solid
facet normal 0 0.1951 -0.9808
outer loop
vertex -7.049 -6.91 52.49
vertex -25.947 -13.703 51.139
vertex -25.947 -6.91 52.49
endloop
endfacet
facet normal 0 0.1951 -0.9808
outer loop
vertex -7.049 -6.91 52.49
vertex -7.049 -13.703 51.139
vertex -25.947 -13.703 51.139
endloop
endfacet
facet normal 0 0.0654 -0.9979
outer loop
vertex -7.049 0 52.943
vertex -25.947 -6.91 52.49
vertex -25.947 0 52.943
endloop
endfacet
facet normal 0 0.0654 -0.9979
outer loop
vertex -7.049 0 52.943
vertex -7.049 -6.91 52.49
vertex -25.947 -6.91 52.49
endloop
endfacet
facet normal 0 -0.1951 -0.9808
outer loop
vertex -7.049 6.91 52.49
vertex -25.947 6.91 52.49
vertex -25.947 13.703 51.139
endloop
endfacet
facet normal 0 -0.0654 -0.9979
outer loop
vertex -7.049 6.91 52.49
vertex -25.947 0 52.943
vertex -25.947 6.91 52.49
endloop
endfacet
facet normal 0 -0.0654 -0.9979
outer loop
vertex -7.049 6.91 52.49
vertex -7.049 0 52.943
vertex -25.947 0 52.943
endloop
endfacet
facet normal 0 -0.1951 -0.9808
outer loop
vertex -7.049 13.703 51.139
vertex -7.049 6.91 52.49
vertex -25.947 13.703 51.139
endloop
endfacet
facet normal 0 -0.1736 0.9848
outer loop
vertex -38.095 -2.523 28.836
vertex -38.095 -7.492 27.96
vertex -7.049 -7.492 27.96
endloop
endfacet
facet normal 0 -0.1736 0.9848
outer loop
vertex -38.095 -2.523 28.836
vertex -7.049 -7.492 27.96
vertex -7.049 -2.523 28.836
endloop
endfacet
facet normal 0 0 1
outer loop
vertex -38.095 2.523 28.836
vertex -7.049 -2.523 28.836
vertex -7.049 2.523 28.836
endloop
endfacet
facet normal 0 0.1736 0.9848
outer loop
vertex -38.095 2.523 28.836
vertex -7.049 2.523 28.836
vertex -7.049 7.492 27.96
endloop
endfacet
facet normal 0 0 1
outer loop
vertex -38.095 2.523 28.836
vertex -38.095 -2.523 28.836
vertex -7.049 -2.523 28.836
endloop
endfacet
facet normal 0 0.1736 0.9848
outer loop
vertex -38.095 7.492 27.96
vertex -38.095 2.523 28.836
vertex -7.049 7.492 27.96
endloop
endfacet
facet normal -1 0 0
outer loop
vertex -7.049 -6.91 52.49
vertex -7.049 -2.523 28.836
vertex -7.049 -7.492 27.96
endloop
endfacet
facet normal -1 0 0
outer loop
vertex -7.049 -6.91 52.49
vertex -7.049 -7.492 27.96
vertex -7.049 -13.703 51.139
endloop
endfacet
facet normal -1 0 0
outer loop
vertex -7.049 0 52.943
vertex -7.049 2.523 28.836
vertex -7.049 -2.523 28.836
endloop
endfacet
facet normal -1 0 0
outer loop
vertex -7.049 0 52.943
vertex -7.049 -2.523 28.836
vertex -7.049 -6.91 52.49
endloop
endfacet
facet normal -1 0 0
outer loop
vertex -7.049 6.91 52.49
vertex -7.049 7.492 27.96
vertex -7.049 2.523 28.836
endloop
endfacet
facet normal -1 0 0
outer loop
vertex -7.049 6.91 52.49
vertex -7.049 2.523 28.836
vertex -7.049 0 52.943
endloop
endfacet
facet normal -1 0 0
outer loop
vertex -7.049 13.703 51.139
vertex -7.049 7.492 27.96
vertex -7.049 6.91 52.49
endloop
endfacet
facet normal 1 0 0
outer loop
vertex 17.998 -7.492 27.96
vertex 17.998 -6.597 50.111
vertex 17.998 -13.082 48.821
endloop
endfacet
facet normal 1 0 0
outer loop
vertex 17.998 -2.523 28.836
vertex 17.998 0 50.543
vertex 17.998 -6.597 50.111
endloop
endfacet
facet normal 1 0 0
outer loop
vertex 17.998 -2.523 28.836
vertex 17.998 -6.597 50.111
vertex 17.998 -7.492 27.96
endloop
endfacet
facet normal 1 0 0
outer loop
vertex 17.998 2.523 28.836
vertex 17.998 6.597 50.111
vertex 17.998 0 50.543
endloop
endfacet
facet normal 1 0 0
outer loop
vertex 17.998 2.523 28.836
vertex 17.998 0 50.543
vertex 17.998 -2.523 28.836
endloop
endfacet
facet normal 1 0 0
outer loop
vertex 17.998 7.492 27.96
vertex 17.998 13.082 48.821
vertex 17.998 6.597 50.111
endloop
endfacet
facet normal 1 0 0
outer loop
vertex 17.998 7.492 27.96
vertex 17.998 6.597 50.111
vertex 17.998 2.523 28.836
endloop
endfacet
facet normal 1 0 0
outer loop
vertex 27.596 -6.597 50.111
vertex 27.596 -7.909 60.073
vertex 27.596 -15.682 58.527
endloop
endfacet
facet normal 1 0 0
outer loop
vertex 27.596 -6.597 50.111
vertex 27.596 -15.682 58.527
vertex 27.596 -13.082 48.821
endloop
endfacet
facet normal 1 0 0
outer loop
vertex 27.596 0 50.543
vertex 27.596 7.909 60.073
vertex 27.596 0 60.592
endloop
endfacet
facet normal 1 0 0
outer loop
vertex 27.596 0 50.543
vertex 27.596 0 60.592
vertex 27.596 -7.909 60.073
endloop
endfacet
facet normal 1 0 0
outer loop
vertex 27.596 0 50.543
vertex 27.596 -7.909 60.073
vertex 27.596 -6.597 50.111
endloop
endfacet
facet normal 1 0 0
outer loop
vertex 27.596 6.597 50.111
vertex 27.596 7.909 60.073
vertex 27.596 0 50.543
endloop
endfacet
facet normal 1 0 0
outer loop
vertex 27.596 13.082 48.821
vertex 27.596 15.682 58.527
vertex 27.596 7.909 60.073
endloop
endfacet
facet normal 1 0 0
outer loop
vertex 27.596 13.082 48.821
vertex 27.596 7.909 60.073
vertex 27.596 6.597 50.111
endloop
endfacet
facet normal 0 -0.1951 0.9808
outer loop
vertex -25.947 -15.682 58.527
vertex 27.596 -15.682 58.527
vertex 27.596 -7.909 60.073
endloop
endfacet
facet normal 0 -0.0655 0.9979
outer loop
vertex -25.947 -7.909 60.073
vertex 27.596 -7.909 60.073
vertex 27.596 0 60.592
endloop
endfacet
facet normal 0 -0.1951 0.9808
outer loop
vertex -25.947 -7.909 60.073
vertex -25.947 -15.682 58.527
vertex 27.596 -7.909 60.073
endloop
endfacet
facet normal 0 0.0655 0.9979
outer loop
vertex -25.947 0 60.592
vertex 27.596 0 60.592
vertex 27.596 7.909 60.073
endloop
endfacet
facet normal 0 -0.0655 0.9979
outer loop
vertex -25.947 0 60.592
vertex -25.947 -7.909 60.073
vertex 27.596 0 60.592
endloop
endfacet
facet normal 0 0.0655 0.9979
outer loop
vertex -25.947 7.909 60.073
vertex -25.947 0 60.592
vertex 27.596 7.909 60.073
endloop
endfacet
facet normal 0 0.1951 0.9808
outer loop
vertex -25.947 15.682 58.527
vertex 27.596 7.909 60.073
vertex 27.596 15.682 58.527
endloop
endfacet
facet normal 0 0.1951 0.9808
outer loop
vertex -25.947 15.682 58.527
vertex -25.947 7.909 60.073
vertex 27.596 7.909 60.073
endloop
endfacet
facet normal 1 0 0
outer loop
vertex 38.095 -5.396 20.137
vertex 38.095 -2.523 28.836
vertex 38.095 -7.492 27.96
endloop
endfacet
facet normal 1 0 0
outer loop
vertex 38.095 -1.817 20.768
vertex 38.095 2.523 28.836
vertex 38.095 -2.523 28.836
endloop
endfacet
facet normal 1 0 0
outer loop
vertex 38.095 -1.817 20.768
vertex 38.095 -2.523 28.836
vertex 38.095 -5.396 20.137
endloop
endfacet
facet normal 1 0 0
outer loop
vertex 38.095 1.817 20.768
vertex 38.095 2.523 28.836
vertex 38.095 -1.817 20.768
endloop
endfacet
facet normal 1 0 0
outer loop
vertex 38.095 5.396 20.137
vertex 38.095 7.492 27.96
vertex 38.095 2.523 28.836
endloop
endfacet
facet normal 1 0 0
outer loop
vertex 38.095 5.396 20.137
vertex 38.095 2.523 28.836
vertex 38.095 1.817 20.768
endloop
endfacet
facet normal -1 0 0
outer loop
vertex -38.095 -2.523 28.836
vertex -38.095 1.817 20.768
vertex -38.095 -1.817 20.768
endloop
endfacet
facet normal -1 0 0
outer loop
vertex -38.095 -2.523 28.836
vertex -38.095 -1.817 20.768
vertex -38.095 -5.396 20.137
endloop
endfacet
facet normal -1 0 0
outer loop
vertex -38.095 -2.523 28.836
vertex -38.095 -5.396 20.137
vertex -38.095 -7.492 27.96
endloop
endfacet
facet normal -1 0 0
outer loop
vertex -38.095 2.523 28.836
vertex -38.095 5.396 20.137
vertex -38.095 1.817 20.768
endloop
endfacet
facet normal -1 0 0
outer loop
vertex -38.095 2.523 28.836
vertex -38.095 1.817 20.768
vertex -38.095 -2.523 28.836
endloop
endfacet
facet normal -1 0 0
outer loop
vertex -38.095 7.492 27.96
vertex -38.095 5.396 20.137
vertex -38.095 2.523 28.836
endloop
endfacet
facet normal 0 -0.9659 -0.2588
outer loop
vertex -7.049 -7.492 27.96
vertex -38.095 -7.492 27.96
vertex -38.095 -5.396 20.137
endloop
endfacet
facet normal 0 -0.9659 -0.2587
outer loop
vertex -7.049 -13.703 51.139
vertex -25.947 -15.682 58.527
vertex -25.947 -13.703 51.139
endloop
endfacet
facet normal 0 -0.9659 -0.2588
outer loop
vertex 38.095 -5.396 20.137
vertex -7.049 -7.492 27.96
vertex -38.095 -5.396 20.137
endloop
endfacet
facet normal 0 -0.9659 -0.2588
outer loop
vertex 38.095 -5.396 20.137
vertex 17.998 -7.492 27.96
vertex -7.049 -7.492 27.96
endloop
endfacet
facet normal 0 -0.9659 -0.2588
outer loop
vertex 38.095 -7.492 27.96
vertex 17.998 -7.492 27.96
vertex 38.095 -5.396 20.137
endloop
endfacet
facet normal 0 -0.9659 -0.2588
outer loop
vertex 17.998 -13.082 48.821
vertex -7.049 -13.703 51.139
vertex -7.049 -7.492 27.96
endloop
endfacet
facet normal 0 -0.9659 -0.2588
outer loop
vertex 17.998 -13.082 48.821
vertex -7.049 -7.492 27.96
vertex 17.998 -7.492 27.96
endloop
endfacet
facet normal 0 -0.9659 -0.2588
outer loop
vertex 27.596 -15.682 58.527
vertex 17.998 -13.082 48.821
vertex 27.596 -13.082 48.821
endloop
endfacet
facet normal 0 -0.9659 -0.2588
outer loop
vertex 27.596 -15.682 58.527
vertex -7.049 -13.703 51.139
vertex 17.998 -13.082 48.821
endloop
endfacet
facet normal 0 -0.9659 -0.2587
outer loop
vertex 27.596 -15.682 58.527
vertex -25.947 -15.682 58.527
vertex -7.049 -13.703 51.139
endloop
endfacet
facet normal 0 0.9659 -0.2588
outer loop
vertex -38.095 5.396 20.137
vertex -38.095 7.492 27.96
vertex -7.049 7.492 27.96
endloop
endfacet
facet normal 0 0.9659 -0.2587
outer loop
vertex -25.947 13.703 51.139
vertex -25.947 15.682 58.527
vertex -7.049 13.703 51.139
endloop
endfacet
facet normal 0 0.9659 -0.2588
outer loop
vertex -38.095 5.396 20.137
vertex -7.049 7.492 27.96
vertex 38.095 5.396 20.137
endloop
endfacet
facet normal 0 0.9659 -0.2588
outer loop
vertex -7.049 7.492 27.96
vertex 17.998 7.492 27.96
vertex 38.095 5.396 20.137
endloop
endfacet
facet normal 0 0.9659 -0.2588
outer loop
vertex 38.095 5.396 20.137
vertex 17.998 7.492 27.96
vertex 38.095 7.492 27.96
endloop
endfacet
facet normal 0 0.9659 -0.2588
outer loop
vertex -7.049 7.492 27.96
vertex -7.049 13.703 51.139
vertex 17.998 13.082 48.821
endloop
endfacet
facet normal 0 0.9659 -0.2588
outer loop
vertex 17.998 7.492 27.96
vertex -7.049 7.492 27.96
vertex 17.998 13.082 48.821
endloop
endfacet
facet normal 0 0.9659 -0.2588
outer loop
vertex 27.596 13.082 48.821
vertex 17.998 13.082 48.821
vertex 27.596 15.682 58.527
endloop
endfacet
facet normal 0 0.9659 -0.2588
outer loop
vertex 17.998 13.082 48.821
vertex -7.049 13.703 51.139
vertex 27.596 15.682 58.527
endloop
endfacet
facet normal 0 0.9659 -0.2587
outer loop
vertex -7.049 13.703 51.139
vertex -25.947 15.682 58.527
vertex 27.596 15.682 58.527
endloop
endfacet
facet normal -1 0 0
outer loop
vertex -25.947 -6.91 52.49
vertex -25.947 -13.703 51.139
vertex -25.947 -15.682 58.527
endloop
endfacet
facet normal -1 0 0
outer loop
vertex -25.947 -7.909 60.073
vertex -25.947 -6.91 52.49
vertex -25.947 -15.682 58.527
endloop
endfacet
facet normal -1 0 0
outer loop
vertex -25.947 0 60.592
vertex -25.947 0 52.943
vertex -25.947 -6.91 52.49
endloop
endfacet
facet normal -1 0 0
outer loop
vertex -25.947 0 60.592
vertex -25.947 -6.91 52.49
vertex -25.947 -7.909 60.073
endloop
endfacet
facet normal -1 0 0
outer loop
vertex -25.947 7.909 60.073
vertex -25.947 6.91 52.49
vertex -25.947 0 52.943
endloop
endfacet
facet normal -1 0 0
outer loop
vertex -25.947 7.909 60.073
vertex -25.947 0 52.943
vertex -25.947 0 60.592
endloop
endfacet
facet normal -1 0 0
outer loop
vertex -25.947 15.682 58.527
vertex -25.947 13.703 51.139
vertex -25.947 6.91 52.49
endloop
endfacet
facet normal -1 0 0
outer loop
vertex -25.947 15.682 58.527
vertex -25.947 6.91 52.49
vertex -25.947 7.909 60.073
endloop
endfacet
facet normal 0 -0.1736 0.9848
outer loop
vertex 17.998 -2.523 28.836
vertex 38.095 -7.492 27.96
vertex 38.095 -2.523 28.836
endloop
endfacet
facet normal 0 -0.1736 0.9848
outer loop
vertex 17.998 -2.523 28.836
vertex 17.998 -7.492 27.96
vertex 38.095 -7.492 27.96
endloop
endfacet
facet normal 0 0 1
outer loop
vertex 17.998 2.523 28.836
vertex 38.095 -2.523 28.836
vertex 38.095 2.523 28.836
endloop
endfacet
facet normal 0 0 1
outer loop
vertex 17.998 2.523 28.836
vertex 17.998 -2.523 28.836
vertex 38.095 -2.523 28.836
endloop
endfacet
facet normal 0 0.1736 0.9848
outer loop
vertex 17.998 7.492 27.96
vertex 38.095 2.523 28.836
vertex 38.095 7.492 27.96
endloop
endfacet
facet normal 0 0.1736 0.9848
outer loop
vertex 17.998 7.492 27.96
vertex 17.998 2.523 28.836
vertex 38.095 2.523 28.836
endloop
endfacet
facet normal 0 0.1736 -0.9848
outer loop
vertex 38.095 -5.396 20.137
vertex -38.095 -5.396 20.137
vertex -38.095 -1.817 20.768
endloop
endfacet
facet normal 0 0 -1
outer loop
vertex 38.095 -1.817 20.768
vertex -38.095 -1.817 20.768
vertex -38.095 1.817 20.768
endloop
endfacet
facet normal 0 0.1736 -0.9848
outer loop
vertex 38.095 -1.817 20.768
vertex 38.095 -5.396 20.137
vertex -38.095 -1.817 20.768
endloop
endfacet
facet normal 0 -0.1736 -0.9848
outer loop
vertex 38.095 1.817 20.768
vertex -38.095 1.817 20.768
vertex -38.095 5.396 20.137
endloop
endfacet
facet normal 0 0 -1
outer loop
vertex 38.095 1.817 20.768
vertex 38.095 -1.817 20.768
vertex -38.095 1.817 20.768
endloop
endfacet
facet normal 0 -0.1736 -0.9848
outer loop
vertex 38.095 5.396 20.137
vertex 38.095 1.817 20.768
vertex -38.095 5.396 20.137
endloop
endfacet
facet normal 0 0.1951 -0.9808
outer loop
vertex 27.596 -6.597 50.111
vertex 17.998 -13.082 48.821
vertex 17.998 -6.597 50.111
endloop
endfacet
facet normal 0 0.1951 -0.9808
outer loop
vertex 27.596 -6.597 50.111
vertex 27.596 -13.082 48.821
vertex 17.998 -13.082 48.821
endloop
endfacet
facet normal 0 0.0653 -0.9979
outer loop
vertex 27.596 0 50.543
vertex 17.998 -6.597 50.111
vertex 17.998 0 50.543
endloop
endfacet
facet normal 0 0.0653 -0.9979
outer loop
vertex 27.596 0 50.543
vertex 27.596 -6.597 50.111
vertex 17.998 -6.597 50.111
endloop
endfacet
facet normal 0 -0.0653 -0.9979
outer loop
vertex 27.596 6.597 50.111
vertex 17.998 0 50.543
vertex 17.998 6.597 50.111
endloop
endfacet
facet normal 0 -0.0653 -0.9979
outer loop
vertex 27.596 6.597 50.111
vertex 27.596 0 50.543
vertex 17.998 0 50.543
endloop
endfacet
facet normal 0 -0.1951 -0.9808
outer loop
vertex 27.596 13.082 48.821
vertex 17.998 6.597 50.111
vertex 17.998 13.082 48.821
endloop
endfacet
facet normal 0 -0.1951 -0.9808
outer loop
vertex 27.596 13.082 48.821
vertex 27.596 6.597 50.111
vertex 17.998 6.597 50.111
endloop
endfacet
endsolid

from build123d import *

# Parameters (mm, degrees)
F1_ANGLE = 30


with BuildPart() as f1:
    # F0 (on Front) → F1 (revolve, symmetric)
    with BuildSketch(Plane.XZ) as f1_sk:
        Polygon((-38.094878, 28.946124), (-38.094878, 20.847209), (38.094878, 20.847209), (38.094878, 28.946124), (17.997593, 28.946124), (17.997593, 50.543226), (27.596295, 50.543226), (27.596295, 60.591869), (-25.946513, 60.591869), (-25.946513, 52.942902), (-7.049054, 52.942902), (-7.049054, 28.946124), align=None)
    revolve(axis=Axis((1.79977, 0, 0), (1, 0, 0)), revolution_arc=F1_ANGLE / 2)
    revolve(f1_sk.sketch, axis=Axis((1.79977, 0, 0), (-1, 0, 0)), revolution_arc=F1_ANGLE / 2)


solid = f1.part
